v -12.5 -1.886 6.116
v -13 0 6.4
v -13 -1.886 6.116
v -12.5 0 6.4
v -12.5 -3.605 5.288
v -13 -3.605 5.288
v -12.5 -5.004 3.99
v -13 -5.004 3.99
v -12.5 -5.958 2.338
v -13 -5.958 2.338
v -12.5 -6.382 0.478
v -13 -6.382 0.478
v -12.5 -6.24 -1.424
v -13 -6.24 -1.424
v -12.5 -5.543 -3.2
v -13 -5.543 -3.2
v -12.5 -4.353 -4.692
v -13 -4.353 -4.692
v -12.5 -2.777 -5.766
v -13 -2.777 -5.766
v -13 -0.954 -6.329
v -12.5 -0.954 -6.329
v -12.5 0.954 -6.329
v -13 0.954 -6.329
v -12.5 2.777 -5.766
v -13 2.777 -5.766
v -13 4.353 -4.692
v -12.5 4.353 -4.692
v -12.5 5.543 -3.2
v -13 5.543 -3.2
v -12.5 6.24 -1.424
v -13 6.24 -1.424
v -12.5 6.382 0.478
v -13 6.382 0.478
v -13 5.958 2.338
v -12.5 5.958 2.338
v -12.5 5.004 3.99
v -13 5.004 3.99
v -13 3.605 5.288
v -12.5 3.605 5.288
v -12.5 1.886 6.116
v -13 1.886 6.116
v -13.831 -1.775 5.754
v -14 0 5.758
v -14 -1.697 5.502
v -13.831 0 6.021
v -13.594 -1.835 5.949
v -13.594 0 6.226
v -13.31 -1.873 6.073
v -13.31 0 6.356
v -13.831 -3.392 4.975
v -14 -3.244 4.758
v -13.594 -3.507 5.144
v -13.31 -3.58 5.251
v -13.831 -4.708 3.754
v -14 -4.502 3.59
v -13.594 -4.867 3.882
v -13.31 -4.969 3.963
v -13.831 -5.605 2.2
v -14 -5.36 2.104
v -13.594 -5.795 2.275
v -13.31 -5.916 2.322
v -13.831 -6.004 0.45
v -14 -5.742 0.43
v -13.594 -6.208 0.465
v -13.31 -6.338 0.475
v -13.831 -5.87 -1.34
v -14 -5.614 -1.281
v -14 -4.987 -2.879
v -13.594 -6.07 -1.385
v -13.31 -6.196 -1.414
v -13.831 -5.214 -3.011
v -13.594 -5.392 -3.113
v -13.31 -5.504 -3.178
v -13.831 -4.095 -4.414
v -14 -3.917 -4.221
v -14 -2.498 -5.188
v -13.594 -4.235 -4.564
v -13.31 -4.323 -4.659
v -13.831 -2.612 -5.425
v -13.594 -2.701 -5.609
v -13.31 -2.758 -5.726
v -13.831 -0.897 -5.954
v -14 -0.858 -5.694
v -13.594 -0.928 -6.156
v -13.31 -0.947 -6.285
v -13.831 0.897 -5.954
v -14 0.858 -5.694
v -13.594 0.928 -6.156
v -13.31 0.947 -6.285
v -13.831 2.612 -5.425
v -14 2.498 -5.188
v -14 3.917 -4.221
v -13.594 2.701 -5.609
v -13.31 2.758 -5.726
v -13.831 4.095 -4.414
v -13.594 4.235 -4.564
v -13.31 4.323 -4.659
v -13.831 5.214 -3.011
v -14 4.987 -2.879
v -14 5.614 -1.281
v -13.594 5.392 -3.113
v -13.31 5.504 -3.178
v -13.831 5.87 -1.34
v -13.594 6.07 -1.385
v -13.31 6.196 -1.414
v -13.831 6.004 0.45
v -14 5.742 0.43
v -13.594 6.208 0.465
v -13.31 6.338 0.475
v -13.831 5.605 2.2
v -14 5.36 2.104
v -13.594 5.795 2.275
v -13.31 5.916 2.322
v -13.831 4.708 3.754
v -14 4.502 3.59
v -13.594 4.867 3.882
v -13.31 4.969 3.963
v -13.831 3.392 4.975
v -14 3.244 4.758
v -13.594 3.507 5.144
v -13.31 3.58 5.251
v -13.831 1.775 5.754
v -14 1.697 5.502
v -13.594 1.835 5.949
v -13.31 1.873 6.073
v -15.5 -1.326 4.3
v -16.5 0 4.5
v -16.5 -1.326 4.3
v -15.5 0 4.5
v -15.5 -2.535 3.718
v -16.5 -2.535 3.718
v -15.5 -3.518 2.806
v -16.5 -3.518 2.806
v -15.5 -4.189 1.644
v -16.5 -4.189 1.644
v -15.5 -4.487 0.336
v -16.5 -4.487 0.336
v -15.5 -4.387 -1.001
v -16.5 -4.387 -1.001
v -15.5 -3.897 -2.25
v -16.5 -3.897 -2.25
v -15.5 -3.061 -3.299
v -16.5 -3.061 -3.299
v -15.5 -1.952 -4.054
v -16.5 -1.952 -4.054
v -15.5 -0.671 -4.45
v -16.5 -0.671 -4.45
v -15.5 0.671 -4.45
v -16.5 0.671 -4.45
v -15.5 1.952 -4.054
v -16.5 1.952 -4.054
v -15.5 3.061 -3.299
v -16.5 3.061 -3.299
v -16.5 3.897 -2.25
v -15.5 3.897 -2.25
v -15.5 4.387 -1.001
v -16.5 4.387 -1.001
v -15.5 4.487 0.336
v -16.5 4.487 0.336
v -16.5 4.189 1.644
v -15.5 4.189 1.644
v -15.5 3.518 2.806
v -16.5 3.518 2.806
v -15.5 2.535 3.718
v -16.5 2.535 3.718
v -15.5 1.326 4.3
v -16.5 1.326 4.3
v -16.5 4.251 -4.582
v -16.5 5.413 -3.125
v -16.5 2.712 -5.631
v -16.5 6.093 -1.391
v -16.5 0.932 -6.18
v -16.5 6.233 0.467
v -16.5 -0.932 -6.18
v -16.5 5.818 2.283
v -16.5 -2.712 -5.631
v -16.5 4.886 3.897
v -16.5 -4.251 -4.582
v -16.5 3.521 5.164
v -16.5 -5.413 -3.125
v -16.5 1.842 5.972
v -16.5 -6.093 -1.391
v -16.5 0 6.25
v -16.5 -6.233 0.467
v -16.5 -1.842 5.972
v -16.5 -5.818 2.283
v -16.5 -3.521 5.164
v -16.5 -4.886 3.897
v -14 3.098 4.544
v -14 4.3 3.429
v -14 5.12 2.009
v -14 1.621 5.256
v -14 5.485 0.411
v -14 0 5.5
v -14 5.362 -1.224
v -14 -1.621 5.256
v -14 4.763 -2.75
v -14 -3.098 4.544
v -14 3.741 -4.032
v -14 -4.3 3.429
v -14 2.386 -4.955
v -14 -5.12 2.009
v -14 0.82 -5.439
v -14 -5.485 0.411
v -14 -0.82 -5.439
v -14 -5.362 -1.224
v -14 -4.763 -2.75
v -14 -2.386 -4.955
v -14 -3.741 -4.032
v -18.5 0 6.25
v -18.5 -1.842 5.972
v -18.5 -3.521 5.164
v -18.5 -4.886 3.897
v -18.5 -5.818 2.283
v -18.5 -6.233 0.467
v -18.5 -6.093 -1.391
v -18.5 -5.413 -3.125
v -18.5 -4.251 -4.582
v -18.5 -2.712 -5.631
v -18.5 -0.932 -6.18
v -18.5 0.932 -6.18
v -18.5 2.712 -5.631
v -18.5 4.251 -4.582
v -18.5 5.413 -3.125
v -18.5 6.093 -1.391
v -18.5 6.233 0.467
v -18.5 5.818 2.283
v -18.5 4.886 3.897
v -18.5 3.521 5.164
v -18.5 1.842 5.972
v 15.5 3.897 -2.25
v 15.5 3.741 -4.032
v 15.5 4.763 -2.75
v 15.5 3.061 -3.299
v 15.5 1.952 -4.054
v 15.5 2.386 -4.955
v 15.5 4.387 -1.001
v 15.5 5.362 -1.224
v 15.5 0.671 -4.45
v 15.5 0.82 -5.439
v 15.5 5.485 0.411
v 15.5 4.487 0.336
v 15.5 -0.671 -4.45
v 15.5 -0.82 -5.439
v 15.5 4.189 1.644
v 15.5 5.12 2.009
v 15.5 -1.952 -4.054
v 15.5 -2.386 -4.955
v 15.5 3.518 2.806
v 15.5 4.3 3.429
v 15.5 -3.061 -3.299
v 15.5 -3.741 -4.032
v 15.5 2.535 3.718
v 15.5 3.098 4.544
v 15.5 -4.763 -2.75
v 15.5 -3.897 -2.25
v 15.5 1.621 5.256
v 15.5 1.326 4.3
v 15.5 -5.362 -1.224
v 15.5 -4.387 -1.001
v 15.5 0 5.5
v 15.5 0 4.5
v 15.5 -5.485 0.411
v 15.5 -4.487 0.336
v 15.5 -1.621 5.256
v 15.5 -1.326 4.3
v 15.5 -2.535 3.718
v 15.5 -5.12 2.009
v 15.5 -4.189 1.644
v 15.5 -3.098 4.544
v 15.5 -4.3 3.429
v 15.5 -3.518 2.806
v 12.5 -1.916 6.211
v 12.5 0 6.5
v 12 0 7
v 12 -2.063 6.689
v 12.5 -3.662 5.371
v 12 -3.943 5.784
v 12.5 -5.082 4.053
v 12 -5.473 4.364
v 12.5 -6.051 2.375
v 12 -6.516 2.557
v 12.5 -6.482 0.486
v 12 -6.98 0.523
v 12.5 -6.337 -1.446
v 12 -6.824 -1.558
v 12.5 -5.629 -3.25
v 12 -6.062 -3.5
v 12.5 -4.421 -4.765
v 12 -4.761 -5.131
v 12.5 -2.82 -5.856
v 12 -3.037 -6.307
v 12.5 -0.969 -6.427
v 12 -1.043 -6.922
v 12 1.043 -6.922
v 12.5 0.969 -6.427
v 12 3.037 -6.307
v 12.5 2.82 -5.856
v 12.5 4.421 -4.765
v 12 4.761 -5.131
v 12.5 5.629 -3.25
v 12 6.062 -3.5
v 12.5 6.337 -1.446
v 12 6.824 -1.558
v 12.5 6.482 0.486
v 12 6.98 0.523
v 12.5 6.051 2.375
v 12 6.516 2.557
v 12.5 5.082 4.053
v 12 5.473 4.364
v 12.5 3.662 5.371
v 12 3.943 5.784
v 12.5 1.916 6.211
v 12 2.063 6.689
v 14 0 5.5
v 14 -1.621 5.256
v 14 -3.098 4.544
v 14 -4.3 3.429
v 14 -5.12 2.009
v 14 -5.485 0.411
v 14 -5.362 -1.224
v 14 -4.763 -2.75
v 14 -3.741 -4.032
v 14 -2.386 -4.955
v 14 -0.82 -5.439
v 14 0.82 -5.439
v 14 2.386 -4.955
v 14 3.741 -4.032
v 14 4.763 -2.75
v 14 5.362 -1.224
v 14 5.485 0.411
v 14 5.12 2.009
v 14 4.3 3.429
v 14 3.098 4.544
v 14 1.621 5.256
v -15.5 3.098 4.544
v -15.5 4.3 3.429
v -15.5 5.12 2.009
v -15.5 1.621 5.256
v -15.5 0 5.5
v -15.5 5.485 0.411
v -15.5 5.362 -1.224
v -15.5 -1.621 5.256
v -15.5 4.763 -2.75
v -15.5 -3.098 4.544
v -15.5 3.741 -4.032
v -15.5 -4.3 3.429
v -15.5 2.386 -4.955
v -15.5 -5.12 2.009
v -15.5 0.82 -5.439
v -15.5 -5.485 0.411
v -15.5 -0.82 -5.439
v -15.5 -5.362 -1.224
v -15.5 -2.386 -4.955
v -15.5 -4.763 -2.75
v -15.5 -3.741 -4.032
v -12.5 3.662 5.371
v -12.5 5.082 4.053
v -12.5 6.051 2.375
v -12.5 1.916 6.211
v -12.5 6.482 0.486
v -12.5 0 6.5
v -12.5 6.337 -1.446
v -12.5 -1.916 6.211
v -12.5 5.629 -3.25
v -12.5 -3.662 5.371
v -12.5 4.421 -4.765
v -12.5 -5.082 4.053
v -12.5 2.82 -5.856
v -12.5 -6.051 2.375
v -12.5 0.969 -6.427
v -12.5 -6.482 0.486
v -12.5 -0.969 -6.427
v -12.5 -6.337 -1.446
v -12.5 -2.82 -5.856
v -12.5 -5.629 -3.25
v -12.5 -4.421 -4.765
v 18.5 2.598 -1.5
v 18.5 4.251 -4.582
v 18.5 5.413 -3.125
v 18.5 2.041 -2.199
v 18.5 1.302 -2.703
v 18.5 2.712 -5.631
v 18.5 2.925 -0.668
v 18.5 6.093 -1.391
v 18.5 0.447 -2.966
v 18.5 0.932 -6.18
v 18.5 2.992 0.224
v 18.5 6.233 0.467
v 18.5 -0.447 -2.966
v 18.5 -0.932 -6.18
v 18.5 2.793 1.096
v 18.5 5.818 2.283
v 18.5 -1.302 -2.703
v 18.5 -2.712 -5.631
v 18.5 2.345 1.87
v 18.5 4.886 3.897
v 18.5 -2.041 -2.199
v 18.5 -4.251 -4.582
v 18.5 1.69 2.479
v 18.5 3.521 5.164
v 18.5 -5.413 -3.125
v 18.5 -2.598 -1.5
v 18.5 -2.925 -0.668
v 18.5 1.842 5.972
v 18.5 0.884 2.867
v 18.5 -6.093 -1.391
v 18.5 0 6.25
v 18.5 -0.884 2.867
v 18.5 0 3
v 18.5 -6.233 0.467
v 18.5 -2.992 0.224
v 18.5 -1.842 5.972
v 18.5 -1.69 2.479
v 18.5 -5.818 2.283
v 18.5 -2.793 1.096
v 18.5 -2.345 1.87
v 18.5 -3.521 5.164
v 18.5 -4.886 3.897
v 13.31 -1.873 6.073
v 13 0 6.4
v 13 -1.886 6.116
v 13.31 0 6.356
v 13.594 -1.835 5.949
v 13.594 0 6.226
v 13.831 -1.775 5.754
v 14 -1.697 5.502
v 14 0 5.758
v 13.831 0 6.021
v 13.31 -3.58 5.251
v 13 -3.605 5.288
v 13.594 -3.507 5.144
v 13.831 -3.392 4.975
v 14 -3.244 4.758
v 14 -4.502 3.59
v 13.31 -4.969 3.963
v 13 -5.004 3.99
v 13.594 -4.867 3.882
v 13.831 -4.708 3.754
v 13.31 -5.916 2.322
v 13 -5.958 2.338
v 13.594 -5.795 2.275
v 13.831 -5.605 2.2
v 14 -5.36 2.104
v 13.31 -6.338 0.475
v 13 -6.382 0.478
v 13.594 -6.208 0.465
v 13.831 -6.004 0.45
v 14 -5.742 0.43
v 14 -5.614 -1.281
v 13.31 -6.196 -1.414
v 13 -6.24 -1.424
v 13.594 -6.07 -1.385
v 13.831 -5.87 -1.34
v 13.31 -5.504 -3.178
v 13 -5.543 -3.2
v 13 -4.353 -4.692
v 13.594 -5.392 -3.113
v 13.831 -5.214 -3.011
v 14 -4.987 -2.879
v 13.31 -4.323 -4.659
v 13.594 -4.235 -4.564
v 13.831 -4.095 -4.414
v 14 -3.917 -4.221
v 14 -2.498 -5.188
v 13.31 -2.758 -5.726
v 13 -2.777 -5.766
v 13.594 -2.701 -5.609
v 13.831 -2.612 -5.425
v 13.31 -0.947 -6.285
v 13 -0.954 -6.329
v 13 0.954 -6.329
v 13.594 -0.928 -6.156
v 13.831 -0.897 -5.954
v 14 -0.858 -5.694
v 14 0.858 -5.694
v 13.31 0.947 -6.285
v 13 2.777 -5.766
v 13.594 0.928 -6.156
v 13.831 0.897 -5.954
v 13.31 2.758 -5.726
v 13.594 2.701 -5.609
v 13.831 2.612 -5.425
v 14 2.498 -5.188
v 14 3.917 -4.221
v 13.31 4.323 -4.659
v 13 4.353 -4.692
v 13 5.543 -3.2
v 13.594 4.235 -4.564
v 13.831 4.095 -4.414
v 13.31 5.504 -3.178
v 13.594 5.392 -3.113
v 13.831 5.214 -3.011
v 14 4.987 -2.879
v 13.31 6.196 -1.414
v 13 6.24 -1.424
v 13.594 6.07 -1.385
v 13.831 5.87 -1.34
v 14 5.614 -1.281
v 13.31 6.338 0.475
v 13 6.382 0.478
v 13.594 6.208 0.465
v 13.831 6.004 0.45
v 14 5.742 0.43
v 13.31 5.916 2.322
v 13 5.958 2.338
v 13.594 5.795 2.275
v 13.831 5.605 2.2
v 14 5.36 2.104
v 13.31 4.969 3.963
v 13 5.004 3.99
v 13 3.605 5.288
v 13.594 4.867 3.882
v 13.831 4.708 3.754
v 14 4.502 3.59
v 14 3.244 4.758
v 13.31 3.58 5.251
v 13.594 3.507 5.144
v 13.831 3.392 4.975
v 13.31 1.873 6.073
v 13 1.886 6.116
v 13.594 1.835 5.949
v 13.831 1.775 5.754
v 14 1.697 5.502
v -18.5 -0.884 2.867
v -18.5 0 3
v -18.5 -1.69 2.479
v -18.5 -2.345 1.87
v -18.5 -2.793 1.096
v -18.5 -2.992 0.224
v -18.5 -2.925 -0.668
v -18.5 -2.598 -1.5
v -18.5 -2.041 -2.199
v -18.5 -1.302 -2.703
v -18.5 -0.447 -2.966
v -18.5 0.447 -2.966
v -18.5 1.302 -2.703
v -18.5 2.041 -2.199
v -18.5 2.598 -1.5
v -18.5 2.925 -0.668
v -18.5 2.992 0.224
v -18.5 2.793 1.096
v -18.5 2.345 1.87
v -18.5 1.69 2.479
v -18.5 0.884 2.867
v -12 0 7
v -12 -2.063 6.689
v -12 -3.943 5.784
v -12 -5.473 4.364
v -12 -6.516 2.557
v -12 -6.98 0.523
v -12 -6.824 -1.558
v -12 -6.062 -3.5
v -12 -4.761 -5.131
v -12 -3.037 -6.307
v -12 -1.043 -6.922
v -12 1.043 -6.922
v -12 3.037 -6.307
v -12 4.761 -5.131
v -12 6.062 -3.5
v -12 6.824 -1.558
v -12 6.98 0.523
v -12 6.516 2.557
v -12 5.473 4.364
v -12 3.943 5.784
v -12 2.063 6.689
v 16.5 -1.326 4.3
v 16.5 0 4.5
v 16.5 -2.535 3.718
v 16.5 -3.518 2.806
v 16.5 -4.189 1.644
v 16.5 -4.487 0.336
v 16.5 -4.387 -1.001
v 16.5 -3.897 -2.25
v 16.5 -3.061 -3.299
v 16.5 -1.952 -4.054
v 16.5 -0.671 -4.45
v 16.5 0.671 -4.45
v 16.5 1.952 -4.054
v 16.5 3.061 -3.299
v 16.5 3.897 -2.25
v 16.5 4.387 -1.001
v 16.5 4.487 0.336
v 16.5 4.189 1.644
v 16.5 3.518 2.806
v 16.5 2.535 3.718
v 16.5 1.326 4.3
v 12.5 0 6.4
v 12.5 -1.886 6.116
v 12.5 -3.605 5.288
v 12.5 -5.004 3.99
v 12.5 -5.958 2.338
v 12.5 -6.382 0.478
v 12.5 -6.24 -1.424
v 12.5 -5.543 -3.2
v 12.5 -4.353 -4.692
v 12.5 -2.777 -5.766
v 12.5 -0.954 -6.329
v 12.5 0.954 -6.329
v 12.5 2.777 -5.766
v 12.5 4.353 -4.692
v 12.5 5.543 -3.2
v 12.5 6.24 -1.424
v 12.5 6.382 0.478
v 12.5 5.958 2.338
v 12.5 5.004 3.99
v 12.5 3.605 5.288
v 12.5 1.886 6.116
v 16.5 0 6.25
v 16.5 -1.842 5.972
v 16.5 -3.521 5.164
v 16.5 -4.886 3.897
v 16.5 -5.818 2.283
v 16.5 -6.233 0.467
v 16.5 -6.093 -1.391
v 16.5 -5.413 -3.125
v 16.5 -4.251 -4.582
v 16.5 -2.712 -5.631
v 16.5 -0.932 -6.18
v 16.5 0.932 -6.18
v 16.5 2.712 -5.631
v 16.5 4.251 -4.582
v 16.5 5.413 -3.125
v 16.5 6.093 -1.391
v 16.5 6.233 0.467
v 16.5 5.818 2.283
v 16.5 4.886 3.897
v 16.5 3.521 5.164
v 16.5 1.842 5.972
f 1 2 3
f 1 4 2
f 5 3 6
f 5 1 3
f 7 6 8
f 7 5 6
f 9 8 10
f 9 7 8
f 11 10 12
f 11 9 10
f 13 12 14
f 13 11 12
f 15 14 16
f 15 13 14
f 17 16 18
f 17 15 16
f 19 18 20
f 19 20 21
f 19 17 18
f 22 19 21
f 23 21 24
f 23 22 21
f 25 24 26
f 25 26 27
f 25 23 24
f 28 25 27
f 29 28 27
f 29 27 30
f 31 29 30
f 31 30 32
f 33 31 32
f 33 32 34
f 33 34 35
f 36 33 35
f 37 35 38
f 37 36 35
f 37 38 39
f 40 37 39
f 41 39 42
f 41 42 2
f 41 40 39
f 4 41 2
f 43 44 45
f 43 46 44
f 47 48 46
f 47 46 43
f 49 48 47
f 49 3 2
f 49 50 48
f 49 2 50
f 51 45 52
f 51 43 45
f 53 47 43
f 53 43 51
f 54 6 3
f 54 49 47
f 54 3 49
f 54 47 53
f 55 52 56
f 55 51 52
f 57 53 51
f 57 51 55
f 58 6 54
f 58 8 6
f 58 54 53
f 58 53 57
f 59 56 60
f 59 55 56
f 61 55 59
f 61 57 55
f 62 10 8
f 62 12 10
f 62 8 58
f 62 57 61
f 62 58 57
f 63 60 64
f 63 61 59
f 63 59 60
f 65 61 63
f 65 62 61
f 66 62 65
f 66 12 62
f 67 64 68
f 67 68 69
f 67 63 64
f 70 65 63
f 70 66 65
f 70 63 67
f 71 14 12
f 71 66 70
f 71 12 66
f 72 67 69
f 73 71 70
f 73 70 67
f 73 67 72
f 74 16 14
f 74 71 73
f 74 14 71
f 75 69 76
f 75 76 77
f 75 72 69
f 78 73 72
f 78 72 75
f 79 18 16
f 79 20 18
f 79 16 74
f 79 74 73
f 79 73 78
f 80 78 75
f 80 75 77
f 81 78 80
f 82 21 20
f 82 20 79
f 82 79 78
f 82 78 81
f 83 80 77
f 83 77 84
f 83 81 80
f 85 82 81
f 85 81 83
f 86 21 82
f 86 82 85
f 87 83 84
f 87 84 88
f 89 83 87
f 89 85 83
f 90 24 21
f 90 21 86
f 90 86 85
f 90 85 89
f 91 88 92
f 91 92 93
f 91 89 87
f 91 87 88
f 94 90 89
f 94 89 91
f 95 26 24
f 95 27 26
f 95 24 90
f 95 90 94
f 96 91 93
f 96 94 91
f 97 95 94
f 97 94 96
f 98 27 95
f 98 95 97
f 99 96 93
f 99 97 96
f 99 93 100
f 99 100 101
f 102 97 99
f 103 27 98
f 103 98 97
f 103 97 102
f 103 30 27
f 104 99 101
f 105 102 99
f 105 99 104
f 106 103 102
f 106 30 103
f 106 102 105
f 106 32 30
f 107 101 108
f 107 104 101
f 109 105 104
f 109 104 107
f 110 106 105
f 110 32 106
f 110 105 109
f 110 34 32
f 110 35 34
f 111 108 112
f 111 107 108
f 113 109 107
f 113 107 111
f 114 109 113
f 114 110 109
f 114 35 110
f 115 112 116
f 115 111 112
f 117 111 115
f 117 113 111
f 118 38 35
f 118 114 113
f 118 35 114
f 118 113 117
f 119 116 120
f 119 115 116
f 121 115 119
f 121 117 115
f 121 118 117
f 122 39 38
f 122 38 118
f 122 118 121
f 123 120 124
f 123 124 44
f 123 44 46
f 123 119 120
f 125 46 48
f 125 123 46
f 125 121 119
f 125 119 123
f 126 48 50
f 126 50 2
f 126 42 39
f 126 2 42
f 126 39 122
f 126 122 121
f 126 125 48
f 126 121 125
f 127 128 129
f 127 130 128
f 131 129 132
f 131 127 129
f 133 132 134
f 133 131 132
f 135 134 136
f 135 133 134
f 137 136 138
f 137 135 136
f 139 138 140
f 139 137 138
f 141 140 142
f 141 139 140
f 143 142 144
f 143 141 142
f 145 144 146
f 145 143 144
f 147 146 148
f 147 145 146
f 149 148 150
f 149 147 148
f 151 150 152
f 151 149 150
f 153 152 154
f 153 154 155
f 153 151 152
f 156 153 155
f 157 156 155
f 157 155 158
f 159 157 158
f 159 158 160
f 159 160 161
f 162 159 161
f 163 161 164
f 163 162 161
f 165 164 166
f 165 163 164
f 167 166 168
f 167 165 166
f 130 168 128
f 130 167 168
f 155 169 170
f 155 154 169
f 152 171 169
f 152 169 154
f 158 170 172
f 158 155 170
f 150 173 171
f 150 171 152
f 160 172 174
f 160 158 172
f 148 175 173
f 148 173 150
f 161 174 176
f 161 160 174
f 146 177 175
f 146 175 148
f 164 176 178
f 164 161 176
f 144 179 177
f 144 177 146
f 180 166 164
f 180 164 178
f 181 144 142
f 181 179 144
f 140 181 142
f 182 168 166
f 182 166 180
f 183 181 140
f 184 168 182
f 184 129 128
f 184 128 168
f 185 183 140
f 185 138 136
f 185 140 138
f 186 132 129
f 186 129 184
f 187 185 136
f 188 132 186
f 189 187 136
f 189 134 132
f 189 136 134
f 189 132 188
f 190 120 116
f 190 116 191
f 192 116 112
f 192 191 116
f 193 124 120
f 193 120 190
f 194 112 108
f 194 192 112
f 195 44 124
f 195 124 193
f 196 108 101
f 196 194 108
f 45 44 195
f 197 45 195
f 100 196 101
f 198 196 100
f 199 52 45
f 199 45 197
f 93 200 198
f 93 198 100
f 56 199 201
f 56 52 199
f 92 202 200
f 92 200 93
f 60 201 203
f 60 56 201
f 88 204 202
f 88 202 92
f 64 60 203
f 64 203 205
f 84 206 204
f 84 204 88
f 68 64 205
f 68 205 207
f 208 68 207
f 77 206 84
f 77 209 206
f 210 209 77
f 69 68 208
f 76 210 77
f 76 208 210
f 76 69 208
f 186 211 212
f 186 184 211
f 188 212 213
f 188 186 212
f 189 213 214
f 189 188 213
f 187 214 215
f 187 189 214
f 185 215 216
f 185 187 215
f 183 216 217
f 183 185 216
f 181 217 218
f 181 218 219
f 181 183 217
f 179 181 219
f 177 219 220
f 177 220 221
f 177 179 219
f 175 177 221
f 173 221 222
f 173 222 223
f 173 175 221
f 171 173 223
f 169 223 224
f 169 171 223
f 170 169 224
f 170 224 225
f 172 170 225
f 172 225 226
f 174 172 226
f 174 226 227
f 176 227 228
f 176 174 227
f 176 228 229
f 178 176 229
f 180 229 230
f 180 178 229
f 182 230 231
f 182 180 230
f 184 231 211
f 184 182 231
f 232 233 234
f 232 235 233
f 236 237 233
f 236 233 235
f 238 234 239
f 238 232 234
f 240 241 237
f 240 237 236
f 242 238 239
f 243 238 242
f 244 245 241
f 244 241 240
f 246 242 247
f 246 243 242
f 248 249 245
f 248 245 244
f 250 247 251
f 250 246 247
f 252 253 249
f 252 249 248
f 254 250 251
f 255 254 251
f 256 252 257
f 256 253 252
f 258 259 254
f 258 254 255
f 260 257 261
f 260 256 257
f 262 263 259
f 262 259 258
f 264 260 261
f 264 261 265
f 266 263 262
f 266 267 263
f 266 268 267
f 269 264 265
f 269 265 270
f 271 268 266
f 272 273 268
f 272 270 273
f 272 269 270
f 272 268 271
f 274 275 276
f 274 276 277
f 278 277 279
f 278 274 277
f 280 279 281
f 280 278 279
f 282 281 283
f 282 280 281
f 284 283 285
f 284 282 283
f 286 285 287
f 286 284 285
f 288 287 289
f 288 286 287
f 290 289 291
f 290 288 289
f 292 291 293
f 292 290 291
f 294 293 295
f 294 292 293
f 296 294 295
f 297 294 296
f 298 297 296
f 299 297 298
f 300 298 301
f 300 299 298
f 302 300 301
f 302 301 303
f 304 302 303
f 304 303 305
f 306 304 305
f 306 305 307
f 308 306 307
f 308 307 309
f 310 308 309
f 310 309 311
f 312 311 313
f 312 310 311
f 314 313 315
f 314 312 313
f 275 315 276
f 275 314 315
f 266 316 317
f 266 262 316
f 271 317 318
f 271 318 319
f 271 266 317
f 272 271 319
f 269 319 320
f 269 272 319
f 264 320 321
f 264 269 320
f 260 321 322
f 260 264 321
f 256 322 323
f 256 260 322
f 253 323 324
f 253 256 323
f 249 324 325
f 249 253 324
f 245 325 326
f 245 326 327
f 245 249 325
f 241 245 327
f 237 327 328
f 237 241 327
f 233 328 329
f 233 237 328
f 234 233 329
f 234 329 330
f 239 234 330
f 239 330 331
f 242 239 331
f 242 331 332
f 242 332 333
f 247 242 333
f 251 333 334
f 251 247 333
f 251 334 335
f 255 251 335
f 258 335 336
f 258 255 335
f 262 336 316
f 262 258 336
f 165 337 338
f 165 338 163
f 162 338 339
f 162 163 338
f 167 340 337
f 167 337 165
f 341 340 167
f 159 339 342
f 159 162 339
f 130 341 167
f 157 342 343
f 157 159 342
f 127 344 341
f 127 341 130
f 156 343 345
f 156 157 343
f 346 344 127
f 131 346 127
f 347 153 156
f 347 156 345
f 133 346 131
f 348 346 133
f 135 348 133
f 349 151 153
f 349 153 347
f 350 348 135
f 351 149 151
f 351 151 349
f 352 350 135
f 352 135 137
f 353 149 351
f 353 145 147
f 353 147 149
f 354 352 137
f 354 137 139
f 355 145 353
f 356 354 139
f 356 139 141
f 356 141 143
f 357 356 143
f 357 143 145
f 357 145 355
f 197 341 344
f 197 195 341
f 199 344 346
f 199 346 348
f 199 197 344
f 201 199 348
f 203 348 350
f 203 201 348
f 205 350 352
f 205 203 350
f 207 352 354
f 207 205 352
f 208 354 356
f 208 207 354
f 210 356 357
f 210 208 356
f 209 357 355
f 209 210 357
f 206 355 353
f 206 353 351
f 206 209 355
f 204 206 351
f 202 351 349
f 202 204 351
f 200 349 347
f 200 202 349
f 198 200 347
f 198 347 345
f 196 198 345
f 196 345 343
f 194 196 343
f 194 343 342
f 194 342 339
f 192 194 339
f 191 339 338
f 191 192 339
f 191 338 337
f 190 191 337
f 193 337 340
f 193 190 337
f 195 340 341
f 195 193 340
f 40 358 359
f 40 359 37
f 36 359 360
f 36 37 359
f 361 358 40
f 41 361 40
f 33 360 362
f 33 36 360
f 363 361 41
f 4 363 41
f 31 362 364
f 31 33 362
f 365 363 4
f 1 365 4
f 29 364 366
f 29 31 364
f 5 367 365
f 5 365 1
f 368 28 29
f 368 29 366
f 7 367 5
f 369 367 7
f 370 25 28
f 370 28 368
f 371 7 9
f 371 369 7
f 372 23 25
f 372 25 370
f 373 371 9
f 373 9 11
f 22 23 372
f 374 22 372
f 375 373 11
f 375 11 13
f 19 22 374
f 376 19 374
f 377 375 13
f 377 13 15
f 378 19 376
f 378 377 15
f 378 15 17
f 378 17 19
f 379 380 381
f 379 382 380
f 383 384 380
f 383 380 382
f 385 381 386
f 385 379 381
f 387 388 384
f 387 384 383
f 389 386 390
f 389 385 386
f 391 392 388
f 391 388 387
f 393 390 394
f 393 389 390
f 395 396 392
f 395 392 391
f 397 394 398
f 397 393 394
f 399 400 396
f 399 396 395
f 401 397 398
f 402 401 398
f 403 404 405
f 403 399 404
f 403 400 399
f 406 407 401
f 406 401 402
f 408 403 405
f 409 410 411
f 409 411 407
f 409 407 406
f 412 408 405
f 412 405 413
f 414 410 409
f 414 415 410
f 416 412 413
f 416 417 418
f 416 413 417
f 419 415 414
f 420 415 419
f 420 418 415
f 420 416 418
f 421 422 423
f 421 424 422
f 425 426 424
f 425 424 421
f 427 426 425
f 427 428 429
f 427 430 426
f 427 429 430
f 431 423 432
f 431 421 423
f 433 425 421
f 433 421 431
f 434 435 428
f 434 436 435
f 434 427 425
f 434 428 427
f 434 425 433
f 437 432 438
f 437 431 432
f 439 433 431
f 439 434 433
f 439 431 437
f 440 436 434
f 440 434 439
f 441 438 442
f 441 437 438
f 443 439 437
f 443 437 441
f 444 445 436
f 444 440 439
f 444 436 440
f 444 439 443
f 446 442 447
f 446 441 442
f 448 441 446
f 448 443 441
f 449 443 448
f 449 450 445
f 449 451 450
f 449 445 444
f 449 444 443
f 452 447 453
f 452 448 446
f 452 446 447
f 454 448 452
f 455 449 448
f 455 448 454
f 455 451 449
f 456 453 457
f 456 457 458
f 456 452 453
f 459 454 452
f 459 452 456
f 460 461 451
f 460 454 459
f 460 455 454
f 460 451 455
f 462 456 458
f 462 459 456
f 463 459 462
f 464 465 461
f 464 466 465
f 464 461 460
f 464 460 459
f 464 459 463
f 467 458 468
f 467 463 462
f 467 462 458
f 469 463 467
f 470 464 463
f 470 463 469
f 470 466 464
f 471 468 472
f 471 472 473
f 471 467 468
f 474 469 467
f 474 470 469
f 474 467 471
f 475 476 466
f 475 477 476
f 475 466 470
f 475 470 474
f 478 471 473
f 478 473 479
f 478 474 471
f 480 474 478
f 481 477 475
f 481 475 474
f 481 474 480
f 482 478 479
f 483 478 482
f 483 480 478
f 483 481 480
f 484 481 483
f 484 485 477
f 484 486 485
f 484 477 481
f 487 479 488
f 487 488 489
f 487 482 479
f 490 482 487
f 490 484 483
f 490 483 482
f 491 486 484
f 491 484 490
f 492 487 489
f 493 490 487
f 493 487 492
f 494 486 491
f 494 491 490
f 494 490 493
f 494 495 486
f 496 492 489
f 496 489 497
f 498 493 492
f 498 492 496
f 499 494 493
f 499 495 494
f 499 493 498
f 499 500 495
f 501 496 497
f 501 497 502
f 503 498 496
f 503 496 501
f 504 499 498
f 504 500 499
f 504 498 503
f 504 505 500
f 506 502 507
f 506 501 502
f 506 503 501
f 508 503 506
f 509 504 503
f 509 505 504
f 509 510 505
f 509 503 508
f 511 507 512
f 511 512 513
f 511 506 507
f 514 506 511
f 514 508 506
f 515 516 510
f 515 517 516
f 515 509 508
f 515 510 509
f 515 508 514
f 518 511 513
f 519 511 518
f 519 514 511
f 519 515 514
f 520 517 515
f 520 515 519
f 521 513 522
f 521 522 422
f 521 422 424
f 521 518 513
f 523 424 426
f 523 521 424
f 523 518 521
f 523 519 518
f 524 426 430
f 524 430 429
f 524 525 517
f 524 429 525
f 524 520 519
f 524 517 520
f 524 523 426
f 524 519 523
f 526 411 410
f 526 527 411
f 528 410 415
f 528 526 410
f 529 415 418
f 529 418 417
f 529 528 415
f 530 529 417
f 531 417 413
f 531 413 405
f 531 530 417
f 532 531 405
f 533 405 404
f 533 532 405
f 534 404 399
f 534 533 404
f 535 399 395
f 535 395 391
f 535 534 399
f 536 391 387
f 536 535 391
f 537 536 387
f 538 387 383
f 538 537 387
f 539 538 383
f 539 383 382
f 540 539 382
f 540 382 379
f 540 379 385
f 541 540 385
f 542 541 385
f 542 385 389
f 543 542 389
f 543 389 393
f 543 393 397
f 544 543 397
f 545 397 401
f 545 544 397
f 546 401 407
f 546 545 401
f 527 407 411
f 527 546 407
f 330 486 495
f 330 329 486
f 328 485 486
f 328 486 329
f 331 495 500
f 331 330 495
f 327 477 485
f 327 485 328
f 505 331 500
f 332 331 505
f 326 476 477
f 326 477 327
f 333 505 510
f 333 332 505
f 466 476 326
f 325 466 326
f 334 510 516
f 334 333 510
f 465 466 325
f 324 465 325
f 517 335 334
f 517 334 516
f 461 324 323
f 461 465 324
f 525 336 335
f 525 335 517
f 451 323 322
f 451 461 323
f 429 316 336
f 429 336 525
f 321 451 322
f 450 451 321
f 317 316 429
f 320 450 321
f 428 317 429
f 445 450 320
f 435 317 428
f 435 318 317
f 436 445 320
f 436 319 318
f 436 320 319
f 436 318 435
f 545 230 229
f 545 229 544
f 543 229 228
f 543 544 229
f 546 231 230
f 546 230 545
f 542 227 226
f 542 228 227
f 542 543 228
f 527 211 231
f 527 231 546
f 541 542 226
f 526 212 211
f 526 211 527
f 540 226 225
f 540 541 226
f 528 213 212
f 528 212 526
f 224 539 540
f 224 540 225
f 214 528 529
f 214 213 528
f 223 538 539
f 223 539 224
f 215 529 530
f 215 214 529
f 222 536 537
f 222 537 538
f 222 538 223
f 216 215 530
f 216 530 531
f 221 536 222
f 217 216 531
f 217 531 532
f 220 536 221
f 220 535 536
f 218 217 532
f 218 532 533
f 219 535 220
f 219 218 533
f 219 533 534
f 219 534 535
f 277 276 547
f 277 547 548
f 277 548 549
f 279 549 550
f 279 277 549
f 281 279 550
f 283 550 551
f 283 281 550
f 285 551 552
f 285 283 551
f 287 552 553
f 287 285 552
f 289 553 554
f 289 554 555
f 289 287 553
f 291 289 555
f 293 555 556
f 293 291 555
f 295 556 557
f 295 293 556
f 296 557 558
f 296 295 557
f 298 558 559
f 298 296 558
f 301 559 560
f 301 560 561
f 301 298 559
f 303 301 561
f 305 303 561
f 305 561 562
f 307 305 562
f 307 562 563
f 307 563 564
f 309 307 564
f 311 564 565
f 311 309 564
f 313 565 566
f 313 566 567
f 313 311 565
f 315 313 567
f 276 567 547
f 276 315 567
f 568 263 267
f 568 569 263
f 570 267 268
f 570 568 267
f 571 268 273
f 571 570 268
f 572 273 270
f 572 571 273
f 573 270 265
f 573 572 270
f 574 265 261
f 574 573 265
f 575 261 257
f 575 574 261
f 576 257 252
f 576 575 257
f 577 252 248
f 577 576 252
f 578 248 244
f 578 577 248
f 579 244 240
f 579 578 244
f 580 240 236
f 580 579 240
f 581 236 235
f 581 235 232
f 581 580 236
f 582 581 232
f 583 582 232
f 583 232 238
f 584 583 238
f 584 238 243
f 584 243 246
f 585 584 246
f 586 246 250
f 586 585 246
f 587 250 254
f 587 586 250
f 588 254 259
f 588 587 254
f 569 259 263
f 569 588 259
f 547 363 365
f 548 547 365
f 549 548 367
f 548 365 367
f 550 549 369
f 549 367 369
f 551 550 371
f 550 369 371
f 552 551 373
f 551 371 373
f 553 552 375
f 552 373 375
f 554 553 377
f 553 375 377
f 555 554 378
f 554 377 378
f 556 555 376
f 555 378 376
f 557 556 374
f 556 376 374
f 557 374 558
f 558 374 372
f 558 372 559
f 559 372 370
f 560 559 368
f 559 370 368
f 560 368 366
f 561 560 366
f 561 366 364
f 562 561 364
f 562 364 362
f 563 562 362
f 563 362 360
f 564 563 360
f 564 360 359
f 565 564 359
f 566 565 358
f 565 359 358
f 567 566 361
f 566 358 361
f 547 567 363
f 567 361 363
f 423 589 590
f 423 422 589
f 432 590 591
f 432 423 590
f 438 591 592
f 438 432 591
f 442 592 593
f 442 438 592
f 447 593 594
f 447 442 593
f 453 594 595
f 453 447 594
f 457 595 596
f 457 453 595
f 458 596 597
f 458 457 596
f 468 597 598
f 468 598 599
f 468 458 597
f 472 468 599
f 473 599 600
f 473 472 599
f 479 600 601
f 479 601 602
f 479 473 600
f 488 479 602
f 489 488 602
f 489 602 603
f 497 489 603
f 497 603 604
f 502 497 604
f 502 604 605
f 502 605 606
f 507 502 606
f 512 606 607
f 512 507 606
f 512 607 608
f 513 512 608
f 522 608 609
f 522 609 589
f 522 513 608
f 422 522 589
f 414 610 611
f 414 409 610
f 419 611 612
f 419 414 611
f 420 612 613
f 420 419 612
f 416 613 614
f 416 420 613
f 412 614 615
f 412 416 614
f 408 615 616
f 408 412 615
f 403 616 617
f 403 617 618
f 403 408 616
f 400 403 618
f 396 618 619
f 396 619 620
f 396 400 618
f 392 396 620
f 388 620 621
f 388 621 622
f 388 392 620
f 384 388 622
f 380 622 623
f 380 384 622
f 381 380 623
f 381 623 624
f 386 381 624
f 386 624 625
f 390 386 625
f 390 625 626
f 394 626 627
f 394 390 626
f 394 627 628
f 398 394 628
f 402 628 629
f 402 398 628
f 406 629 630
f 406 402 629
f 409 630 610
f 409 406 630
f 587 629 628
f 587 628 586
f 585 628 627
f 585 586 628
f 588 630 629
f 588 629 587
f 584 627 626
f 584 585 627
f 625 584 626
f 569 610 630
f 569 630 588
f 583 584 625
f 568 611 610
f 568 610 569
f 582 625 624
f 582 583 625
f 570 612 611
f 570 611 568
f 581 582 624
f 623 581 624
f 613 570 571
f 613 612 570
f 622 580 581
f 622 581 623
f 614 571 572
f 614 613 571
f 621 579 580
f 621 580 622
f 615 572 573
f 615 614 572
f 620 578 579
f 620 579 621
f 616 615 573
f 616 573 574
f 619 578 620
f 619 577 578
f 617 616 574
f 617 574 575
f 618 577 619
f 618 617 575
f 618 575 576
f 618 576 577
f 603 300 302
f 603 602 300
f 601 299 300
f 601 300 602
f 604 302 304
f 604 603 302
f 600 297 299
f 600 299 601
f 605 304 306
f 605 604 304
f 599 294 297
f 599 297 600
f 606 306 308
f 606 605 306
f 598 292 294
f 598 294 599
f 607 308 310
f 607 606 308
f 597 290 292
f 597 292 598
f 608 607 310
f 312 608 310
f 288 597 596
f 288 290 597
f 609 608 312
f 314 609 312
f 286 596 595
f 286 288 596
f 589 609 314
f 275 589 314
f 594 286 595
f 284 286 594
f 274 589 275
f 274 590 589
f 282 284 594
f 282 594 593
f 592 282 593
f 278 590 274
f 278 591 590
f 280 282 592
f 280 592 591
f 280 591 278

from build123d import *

# Parameters (mm, degrees)
CHAMFER_1_SIZE = 0.5


with BuildPart() as part:
    # 草图1 → 旋转1 (revolve)
    with BuildSketch(Plane(origin=(0, 0, 0), x_dir=(1, 0, 0), z_dir=(0, 1, 0)), mode=Mode.PRIVATE) as revolve_1_sk:
        with BuildLine():
            Line((-12.5, 7), (12.5, 7))
            Line((12.5, 7), (12.5, 6.4))
            Line((12.5, 6.4), (13, 6.4))
            ThreePointArc((13, 6.4), (13.594102968, 6.225765447), (14, 5.758257569))
            Line((14, 5.758257569), (14, 5.5))
            Line((14, 5.5), (15.5, 5.5))
            Line((15.5, 5.5), (15.5, 4.5))
            Line((15.5, 4.5), (16.5, 4.5))
            Line((16.5, 4.5), (16.5, 6.25))
            Line((16.5, 6.25), (18.5, 6.25))
            Line((18.5, 6.25), (18.5, 3))
            Line((18.5, 3), (-18.5, 3))
            Line((-18.5, 3), (-18.5, 6.25))
            Line((-18.5, 6.25), (-16.5, 6.25))
            Line((-16.5, 6.25), (-16.5, 4.5))
            Line((-16.5, 4.5), (-15.5, 4.5))
            Line((-15.5, 4.5), (-15.5, 5.5))
            Line((-15.5, 5.5), (-14, 5.5))
            Line((-14, 5.5), (-14, 5.758257569))
            ThreePointArc((-14, 5.758257569), (-13.594102968, 6.225765447), (-13, 6.4))
            Line((-13, 6.4), (-12.5, 6.4))
            Line((-12.5, 6.4), (-12.5, 7))
        make_face()
    revolve(revolve_1_sk.sketch.rotate(Axis((-37.377186512, 0, 0), (1, 0, 0)), 180), axis=Axis((-37.377186512, 0, 0), (1, 0, 0)))

    # 倒角1
    chamfer_1_edges = [part.edges().sort_by_distance(p)[0] for p in [
        (-12.5, 0, -7),
        (12.5, 0, -7),
    ]]
    chamfer(chamfer_1_edges, length=CHAMFER_1_SIZE)


solid = part.part
